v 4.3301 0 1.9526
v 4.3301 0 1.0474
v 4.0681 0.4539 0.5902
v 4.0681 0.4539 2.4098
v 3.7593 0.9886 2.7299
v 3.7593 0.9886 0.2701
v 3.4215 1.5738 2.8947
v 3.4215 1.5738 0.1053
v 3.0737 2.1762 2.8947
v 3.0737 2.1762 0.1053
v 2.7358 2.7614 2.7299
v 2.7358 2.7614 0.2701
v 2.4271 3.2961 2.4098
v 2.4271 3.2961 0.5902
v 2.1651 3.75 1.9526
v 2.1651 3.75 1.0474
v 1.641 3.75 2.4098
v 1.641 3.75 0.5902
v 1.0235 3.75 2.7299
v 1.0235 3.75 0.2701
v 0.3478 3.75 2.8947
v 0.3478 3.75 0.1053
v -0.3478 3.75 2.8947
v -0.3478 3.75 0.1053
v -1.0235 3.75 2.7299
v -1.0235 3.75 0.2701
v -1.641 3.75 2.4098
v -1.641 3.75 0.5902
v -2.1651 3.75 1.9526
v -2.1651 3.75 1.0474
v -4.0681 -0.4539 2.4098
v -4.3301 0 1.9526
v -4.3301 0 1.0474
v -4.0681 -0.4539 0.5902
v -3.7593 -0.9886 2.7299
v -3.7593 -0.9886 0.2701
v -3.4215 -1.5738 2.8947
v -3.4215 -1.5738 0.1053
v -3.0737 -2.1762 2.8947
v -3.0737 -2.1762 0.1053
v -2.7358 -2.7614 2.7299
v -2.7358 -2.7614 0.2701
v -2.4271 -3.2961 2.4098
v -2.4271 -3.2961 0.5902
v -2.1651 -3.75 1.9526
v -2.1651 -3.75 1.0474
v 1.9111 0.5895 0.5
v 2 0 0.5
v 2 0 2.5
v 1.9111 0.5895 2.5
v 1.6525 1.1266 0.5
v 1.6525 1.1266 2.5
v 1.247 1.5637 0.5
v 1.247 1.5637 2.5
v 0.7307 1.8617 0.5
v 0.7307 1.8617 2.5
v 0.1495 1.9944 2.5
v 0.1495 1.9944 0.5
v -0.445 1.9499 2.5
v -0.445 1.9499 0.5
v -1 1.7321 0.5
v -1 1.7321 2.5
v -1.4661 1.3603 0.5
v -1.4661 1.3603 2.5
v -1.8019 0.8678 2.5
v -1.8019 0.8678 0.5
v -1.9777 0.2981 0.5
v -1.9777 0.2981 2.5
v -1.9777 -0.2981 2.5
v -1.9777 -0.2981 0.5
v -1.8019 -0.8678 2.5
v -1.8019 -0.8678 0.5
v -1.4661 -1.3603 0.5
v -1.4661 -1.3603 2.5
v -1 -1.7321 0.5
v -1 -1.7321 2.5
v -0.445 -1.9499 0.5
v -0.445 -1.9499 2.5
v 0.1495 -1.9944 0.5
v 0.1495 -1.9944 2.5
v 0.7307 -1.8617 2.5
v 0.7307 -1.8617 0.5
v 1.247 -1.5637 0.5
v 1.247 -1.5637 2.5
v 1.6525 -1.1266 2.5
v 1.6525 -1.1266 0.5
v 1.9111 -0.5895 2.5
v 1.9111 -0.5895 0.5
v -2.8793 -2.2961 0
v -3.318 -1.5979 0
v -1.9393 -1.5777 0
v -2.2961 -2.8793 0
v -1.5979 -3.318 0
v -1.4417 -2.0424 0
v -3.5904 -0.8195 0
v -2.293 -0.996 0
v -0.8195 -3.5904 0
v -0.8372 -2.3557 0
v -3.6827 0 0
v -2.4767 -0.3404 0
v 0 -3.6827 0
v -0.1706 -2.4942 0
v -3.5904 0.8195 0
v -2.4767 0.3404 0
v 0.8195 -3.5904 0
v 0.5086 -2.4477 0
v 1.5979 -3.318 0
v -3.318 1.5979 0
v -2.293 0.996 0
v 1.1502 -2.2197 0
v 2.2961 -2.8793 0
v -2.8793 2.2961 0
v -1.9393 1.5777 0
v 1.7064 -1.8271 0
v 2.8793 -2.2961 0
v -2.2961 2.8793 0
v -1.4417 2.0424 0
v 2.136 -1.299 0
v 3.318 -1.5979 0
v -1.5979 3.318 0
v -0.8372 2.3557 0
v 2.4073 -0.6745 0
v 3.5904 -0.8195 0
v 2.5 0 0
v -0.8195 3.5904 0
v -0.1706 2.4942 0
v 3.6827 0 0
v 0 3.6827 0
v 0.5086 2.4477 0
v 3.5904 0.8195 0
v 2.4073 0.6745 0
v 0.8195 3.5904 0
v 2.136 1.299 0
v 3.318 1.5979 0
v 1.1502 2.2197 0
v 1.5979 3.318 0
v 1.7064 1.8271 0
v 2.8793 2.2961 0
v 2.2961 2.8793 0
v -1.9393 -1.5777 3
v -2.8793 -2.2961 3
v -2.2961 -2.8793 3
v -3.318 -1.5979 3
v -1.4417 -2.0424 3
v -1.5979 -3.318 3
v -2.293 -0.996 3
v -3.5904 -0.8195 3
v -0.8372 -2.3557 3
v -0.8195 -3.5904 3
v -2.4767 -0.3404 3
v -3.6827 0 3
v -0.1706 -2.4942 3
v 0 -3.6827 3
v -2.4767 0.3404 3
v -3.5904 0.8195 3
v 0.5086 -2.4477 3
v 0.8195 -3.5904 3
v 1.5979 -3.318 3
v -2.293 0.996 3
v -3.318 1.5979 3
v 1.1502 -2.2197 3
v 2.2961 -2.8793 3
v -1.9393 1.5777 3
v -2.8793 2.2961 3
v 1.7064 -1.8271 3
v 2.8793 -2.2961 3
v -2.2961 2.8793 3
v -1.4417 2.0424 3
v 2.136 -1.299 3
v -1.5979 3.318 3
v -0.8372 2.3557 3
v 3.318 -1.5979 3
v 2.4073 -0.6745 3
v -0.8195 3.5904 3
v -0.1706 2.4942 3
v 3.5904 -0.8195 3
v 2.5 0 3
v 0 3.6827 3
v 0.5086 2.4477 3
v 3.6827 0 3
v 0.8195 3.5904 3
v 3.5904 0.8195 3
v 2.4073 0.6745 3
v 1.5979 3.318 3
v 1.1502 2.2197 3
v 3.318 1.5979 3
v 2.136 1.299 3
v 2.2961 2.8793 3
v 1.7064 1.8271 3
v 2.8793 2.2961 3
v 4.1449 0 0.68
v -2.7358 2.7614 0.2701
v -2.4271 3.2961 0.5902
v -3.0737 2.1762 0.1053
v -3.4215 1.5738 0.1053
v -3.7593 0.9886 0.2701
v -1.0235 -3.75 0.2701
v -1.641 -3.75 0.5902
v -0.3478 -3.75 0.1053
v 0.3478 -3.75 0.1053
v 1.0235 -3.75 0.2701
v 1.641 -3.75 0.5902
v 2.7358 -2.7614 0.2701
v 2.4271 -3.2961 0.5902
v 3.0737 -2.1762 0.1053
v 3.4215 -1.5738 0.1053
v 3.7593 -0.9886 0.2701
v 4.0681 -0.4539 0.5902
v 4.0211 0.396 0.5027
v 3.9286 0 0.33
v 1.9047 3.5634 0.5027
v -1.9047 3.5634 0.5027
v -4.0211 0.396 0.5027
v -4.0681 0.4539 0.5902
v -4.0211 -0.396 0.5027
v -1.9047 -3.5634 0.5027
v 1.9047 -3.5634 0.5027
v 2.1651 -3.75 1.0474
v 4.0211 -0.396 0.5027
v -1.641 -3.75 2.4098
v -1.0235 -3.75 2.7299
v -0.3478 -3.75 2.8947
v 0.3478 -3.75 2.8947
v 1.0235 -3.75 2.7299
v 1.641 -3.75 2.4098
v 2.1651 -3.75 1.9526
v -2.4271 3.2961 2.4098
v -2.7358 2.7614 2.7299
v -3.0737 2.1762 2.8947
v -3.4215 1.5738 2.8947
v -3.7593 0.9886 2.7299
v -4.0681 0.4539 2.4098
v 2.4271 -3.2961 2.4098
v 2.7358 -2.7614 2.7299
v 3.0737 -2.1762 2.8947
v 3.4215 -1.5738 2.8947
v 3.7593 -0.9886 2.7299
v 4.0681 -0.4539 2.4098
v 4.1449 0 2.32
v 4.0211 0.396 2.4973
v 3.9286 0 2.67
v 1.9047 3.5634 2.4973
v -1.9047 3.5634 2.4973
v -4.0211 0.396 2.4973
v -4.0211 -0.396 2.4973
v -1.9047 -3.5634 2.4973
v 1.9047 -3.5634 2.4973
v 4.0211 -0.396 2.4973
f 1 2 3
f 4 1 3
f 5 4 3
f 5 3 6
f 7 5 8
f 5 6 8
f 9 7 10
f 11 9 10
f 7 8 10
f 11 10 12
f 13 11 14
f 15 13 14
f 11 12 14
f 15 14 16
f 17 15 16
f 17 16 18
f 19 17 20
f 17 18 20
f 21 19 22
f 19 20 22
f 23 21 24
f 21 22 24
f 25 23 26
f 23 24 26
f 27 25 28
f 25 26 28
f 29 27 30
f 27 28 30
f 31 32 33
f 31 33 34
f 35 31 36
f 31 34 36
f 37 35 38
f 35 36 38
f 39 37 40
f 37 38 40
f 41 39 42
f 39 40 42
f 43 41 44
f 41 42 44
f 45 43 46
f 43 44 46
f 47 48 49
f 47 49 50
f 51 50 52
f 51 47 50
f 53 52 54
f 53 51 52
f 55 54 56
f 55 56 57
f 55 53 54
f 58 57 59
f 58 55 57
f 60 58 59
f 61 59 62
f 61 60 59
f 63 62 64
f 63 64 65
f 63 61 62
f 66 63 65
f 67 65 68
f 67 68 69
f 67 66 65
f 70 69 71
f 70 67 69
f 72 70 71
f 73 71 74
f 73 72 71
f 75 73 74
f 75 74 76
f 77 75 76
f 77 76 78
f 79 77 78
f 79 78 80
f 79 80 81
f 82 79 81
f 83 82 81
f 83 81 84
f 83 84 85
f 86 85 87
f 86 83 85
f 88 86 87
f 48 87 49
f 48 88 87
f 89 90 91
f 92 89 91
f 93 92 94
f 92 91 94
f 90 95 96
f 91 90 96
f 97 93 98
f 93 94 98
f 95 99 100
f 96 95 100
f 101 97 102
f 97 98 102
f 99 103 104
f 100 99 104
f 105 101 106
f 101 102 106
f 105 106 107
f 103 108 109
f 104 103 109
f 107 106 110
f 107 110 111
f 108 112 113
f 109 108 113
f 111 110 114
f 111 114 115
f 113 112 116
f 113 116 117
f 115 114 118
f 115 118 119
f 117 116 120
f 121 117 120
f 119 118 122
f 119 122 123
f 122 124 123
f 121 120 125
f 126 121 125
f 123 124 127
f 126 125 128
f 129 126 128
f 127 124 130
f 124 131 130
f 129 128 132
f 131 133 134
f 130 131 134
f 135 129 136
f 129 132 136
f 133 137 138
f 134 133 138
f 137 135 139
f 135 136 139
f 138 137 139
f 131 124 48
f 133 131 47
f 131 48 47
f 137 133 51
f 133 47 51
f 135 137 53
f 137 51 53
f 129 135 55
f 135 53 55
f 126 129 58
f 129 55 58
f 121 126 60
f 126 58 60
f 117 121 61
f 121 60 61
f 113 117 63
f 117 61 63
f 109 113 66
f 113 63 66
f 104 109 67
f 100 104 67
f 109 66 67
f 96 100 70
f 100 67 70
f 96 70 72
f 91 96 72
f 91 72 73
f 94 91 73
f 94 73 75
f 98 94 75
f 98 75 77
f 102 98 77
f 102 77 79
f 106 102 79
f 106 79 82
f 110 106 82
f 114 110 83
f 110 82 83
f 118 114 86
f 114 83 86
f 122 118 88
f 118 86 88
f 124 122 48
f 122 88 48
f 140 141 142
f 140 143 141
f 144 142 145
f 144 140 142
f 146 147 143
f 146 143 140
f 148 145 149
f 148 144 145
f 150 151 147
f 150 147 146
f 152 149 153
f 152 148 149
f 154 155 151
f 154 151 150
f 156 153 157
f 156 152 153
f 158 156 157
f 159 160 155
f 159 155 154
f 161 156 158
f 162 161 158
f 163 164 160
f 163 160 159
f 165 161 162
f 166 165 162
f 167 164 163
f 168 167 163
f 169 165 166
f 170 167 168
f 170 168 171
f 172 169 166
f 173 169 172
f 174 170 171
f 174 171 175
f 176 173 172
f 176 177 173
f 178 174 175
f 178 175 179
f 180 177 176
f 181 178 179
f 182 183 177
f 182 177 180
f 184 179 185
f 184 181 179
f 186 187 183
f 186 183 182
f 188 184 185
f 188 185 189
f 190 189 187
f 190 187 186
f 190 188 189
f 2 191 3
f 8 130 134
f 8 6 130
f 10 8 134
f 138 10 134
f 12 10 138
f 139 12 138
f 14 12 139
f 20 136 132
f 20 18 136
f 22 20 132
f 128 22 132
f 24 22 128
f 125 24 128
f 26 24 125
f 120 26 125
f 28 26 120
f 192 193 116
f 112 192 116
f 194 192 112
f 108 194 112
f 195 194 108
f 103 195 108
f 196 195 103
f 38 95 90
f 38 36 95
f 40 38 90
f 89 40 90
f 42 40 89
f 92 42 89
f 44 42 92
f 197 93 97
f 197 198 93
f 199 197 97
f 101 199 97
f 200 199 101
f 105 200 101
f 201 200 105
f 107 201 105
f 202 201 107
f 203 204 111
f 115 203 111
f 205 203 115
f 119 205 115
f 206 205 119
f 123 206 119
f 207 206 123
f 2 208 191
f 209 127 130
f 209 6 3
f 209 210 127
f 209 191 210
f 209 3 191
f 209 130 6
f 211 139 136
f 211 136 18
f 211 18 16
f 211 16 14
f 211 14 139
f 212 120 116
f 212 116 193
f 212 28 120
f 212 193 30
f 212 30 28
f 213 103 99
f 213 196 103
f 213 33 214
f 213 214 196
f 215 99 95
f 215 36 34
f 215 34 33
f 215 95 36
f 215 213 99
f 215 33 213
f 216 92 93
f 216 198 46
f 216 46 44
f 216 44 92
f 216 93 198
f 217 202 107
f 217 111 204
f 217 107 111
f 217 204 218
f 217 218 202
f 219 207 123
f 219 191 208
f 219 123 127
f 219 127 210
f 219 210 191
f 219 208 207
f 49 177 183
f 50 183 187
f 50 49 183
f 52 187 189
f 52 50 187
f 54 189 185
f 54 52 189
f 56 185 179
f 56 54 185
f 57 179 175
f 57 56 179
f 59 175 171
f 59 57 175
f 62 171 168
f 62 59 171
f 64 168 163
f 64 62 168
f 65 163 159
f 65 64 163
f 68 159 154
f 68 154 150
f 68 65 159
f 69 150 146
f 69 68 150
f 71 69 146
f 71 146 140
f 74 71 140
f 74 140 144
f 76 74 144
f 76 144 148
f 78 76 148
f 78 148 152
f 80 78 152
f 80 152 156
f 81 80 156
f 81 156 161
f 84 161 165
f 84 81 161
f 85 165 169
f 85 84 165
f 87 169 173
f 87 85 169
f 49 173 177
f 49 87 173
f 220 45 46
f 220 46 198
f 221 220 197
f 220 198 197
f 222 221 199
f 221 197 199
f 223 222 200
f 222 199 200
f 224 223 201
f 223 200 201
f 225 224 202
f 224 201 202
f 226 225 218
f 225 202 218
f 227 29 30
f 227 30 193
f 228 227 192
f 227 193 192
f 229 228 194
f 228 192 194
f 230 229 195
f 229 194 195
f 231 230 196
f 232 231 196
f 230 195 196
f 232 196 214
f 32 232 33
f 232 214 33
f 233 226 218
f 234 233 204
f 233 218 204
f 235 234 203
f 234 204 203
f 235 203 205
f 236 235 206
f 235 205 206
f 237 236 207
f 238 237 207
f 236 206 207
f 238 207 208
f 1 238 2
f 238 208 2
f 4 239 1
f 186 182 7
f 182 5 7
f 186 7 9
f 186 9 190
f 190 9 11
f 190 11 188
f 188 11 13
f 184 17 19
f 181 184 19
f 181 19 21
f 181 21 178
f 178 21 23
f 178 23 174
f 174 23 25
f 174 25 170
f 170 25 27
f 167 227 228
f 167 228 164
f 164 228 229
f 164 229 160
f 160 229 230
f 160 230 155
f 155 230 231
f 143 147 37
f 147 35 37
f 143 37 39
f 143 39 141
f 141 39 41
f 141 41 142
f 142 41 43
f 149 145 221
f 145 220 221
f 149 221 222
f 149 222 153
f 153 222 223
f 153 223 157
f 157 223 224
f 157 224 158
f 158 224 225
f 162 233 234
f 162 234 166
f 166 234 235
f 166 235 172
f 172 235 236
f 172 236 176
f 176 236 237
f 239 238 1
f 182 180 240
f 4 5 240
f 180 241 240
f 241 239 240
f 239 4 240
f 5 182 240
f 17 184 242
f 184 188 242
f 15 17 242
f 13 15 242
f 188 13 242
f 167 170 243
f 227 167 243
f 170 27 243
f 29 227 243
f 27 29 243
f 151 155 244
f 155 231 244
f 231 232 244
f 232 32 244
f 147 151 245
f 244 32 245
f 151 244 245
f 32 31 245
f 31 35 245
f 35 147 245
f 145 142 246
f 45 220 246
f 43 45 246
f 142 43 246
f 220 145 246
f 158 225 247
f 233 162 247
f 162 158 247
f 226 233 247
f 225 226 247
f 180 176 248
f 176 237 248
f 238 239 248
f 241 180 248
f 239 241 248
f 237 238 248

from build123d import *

# Parameters (mm, degrees)
SKETCH1_R           = 2
BOSS_EXTRUDE1_DEPTH = 3
CHAMFER1_SIZE       = 0.5


with BuildPart() as part:
    # Sketch1 → Boss-Extrude1 (new body)
    with BuildSketch(Plane.XY):
        Polygon((4.330127019, 0), (2.165063509, 3.75), (-2.165063509, 3.75), (-4.330127019, 0), (-2.165063509, -3.75), (2.165063509, -3.75), align=None)
        Circle(SKETCH1_R, mode=Mode.SUBTRACT)
    extrude(amount=BOSS_EXTRUDE1_DEPTH)

    # Sketch2 → Cut-Revolve1 (revolve, cut)
    with BuildSketch(Plane(origin=(0, 0, 0), x_dir=(1, 0, 0), z_dir=(0, 1, 0)), mode=Mode.PRIVATE) as cut_revolve1_sk:
        with BuildLine():
            Line((-4.330127019, -1.952562419), (-6.415307532, -1.952562419))
            ThreePointArc((-6.415307532, -1.952562419), (-3.99218262, -5.388056111), (0, -6.70586838))
            Line((0, -6.70586838), (0, -4.75))
            ThreePointArc((0, -4.75), (-2.577579146, -3.989810239), (-4.330127019, -1.952562419))
        make_face()
    cut_revolve1 = revolve(cut_revolve1_sk.sketch.rotate(Axis((0, 0, 1.952562419), (0, 0, 1)), 180), axis=Axis((0, 0, 1.952562419), (0, 0, 1)), mode=Mode.SUBTRACT)

    # Mirror1: Cut-Revolve1 across plane
    add(cut_revolve1.mirror(Plane(origin=(0, 0, 1.5), x_dir=(1, 0, 0), z_dir=(0, 0, -1))), mode=Mode.SUBTRACT)

    # Chamfer1
    chamfer1_edges = [part.edges().sort_by_distance(p)[0] for p in [
        (-2, 0, 0),
        (-2, 0, 3),
    ]]
    chamfer(chamfer1_edges, length=CHAMFER1_SIZE)


solid = part.part
